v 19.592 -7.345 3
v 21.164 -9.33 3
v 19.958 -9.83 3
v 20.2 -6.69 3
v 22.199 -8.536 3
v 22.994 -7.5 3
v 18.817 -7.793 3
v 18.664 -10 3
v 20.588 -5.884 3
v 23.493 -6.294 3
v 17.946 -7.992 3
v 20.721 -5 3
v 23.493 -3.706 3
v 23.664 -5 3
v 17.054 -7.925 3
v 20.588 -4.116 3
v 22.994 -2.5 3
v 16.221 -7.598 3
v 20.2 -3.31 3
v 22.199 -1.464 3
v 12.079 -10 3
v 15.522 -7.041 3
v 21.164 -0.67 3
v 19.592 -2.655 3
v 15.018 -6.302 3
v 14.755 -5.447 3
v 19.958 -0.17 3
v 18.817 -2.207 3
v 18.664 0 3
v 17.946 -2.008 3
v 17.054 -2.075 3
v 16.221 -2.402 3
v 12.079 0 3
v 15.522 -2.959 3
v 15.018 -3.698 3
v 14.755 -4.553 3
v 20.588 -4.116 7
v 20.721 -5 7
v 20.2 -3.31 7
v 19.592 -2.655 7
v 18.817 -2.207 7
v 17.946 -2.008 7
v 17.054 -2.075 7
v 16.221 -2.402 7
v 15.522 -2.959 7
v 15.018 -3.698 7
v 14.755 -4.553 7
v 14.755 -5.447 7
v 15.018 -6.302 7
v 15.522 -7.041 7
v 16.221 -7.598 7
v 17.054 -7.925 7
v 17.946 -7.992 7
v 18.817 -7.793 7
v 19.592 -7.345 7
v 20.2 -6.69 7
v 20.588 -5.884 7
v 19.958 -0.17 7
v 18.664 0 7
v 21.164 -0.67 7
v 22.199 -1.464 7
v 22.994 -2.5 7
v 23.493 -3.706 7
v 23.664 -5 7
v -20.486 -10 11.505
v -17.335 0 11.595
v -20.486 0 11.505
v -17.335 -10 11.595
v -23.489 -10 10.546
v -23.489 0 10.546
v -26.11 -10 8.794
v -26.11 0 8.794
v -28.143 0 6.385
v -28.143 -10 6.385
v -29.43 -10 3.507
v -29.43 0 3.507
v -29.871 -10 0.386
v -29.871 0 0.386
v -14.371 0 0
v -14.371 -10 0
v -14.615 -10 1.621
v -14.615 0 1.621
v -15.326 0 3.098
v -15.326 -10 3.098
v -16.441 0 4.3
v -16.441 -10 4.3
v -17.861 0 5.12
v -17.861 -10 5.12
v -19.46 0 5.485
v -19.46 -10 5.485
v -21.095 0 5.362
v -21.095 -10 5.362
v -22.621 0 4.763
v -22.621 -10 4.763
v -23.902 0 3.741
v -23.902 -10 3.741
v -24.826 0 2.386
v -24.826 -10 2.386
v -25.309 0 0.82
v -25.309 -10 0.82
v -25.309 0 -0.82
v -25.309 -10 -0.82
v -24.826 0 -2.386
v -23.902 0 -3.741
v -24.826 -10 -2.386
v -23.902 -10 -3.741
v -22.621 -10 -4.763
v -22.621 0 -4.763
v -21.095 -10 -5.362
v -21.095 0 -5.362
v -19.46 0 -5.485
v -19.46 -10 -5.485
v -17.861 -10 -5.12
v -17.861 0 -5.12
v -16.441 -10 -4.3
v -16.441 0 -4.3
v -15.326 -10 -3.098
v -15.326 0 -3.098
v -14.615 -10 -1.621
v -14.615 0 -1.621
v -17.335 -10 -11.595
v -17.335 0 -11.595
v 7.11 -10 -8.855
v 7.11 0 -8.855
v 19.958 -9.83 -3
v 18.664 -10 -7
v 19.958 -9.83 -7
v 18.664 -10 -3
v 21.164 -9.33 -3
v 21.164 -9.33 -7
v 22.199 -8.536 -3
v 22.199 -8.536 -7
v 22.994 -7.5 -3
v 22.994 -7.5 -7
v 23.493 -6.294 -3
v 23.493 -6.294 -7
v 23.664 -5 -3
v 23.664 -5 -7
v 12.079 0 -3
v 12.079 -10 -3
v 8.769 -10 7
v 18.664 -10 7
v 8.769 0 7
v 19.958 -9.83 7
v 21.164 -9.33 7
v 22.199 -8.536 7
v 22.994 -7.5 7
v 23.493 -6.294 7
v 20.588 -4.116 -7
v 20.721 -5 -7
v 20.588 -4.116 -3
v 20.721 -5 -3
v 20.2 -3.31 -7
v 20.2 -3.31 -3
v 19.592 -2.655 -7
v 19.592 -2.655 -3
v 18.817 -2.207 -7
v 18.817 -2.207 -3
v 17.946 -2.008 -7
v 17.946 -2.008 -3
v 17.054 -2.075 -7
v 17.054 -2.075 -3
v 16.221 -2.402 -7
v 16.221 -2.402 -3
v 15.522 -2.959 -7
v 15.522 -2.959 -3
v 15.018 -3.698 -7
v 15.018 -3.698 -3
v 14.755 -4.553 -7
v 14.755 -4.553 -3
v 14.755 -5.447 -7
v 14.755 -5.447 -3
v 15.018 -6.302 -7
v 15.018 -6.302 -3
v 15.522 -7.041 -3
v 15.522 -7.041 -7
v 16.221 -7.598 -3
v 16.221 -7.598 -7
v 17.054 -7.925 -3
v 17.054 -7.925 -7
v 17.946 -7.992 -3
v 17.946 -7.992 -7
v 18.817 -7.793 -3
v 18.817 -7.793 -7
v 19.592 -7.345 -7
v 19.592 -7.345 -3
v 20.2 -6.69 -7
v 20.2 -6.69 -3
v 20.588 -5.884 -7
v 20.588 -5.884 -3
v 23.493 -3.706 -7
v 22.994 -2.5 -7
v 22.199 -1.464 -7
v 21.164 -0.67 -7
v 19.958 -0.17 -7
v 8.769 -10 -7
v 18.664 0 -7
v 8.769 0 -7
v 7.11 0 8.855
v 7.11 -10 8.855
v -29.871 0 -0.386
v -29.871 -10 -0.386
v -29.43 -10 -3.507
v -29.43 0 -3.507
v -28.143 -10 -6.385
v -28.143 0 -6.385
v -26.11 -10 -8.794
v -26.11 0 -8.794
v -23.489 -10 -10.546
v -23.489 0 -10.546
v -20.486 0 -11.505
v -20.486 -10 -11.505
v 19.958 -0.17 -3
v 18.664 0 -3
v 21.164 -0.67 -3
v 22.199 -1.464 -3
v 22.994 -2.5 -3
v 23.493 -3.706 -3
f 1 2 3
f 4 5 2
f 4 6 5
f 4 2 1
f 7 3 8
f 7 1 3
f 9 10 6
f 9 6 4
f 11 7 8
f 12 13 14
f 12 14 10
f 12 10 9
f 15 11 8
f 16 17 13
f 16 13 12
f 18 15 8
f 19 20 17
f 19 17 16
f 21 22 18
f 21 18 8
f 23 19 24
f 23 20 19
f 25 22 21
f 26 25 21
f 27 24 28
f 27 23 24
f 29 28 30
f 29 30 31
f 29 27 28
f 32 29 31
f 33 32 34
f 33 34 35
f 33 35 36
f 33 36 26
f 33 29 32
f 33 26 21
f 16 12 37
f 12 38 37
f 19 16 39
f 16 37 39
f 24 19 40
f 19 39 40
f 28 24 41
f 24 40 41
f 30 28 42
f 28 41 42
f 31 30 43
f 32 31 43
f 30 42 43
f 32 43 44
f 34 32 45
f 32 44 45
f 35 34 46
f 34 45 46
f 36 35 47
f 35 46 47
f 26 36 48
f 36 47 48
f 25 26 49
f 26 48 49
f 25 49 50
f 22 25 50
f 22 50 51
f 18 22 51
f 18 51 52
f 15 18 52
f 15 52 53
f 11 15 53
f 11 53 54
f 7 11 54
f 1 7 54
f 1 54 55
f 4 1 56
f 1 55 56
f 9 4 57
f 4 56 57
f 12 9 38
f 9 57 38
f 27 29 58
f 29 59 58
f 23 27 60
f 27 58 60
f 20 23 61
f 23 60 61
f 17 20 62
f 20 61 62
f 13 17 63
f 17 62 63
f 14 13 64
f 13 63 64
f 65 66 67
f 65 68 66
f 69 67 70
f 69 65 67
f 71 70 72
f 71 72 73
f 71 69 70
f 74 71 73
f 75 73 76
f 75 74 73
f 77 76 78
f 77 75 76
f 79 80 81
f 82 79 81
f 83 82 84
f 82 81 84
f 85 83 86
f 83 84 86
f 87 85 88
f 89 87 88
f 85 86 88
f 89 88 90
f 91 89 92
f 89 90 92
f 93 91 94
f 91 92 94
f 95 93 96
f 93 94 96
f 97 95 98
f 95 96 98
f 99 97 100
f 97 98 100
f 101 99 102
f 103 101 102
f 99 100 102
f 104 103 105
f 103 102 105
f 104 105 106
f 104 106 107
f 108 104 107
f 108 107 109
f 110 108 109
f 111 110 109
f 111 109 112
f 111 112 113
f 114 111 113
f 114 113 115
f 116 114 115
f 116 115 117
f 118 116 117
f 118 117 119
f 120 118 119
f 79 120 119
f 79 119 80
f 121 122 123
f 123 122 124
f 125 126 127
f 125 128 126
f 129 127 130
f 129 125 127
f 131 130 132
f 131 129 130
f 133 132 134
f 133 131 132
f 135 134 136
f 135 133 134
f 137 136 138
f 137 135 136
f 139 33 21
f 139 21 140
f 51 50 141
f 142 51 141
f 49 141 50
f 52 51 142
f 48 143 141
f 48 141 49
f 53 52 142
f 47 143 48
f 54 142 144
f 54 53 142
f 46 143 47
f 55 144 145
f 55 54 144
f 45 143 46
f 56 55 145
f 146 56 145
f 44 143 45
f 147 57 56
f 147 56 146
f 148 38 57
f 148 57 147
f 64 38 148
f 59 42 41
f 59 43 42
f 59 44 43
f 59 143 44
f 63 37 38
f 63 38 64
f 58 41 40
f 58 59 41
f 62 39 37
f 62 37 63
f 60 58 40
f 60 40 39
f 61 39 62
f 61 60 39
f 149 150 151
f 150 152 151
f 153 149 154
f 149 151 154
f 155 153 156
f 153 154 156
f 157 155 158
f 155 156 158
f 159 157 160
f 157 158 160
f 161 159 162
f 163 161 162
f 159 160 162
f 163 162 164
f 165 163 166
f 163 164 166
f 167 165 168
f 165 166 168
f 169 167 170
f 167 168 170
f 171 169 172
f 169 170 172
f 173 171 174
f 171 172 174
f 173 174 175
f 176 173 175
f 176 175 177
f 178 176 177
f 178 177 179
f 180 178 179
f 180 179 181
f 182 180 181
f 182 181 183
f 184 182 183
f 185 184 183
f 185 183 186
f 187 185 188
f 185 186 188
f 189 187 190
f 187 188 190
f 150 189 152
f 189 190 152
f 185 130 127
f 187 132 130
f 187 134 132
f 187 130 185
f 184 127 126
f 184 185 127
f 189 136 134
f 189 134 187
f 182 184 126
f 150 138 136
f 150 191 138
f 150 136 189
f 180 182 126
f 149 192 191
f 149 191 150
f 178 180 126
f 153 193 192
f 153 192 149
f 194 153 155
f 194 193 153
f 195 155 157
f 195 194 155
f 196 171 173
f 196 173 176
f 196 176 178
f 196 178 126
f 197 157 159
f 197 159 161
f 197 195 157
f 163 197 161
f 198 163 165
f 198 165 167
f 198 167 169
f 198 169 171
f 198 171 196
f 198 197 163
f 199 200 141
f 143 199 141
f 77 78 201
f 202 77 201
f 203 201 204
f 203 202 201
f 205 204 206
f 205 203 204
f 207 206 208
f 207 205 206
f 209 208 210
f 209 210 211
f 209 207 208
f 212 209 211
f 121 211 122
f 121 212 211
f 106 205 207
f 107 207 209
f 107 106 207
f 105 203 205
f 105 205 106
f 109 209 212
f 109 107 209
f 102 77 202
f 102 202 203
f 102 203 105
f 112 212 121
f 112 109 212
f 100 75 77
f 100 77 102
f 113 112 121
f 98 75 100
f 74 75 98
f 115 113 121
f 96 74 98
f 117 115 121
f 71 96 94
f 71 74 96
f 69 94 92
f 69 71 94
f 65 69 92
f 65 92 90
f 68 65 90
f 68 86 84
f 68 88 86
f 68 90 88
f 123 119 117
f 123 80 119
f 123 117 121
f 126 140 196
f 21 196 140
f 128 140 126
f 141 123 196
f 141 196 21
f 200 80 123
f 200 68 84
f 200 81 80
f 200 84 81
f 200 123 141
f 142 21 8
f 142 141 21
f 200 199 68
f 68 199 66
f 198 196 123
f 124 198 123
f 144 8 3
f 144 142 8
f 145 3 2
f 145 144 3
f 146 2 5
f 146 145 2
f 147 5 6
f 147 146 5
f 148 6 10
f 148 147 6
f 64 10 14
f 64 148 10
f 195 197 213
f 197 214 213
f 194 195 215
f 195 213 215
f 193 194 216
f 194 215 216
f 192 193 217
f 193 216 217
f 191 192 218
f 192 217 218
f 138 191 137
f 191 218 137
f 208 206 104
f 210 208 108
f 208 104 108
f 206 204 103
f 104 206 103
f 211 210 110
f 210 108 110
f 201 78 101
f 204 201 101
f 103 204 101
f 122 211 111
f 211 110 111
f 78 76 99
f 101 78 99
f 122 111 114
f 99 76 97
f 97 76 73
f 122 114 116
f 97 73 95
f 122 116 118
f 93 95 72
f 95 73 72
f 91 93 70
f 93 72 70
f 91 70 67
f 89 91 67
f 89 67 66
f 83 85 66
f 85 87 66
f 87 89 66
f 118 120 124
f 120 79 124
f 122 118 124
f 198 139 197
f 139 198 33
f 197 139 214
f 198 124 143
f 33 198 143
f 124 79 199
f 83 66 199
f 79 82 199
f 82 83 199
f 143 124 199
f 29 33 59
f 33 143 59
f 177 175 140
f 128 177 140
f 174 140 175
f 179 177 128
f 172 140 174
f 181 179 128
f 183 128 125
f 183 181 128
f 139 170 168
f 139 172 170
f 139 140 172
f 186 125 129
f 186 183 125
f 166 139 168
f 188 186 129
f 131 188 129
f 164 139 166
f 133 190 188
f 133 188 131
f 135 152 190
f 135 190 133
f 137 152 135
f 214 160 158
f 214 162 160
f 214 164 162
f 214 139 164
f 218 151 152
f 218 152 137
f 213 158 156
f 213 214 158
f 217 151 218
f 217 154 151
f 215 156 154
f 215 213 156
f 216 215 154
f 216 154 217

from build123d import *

# Parameters (mm, degrees)
F1_DEPTH     = 10
F3_DEPTH     = 25
F4_R         = 3
F5_DEPTH     = 12.5
F6_R         = 4.99999
F7_R         = 11.2793724654
F8_W         = 12.0593691245
F8_H         = 3
F9_DEPTH     = 25
F10_T4_DEPTH = 35.7540736123
F10_T9_DEPTH = 35.7540736123


# Not quite as in the source:
# - a fillet or chamfer that OpenCascade refuses, or shapes differently, is made with other operations: its cross-section is extruded or revolved along the edge and cut away or added
# - a fillet or chamfer is up to 0.001 mm smaller than in the source, because OpenCascade refuses the exact size


with BuildPart() as f1:
    # F0 (on Front) → F1 (new body)
    with BuildSketch(Plane.XZ):
        Polygon((-29.8706907779, 13), (-29.8706907779, 0), (-29.8706907779, -13), (23.6637946218, -7), (23.6637946218, 0), (23.6637946218, 7), align=None)
    extrude(amount=F1_DEPTH)

    # F2 (on face) → F3 (cut)
    with BuildSketch(Plane.XZ.offset(10)):
        with BuildLine():
            ThreePointArc((-25.3706907779, 0), (-19.8706907779, -5.5), (-14.3706907779, 0))
            ThreePointArc((-14.3706907779, 0), (-19.8706907779, 5.5), (-25.3706907779, 0))
        make_face()
    extrude(amount=-F3_DEPTH, mode=Mode.SUBTRACT)

    # F4 (on Top) → F5 (cut, symmetric)
    with BuildSketch(Plane.XY):
        with Locations((17.7213400602, -4.9999998882)):
            Circle(F4_R)
    extrude(amount=F5_DEPTH, both=True, mode=Mode.SUBTRACT)

    # F6 (radius 5 in the source; OpenCascade refuses exactly that, so slightly less here)
    f6_edges = [f1.edges().sort_by_distance(p)[0] for p in [
        (23.663795, -10, 0),
        (23.663795, 0, 0),
    ]]
    fillet(f6_edges, radius=F6_R)

    # F7
    f7_edges = [f1.edges().sort_by_distance(p)[0] for p in [
        (-29.870691, -5, 13),
        (-29.870691, -5, -13),
    ]]
    fillet(f7_edges, radius=F7_R)

    # F8 (on Front) → F9 (cut)
    with BuildSketch(Plane.XZ):
        Polygon((12.0786419138, 3), (12.0786419138, 0), (24.1380110383, 0), (24.2066532373, 3), align=None)
        with Locations((18.1083264761, -1.5)):
            Rectangle(F8_W, F8_H)
        Polygon((25.2308808267, -17.6116619259), (24.1380110383, -7), (12.0786419138, -7), (12.0786419138, -17.6116619259), align=None)
        Polygon((12.0786419138, 14.7170173004), (12.0786419138, 7), (24.2066532373, 7), (23.395627737, 15.3522975743), align=None)
    extrude(amount=F9_DEPTH, mode=Mode.SUBTRACT)

    # F10: chamfer of 5 on 2 edges, made by hand


with BuildPart() as f10_tool2:
    # F10_s3 → F10_t4 (new body)
    with BuildSketch(Plane.XZ.offset(22.8770368062)):
        Polygon((12.0786419138, -3.29843251), (7.1097524238, -8.8553321741), (12.0786419138, -8.29843251), align=None)
    extrude(amount=-F10_T4_DEPTH)

    split(bisect_by=Plane.XY.offset(-7), keep=Keep.BOTTOM)


with BuildPart() as f1_1:
    add(f1.part)

    # F10_t1: cut F10_tool2
    add(f10_tool2.part, mode=Mode.SUBTRACT)


with BuildPart() as f10_tool7:
    # F10_s8 → F10_t9 (new body)
    with BuildSketch(Plane.XZ.offset(-12.8770368062)):
        Polygon((7.1097524238, 8.8553321741), (12.0786419138, 3.29843251), (12.0786419138, 8.29843251), align=None)
    extrude(amount=F10_T9_DEPTH)

    split(bisect_by=Plane.XY.offset(7), keep=Keep.TOP)


with BuildPart() as f1_2:
    add(f1_1.part)

    # F10_t6: cut F10_tool7
    add(f10_tool7.part, mode=Mode.SUBTRACT)


solid = f1_2.part
